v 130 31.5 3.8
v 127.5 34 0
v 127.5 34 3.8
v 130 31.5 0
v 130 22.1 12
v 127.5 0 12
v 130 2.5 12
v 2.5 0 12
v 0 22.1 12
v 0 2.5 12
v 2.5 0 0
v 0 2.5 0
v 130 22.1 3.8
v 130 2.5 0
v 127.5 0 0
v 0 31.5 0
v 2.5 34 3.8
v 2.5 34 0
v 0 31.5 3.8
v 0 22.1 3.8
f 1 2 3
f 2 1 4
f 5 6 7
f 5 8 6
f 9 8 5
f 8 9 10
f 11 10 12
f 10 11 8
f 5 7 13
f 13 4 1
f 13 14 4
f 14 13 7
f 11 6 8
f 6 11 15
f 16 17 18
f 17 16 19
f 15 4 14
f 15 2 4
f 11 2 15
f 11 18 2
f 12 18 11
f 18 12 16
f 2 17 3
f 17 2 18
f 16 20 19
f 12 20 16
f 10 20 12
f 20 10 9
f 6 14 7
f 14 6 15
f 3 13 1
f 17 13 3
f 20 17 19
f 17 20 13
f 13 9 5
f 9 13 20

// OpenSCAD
$fn = 32;

// ----------------------------------------------------------------------
// Stepped bar: sidestep, 130 x 34 x 12/3.8 mm
// ----------------------------------------------------------------------

// --- parameters (mm) ---
bar_l = 130;              // bar length, X
bar_w = 34;               // bar width, Y
plate_t = 12;             // thickness of the thick zone, Z
thin_t = 3.8;             // thickness of the thin zone
corner_c = 2.5;           // corner chamfer of the bar
step_cut = 8.2;           // material removed from the thin zone
ledge_y = 22.1;           // start of the ledge from the front edge
depth_1 = 8.2;            // depth of cut 1 from the top face

profile = [[2.5, 0], [127.5, 0], [130, 2.5], [130, 31.5], [127.5, 34], [2.5, 34], [0, 31.5], [0, 2.5]];  // primary outline, 8 points, counter clockwise
void_1 = [[-1, 22.1], [131, 22.1], [131, 35], [-1, 35]];  // ledge cut along one edge, 4 points

// --- the one profile operation ---
difference() {
  linear_extrude(height = plate_t) polygon(points = profile);
  translate([0, 0, plate_t - depth_1])
    linear_extrude(height = depth_1 + 1) polygon(points = void_1);
}
